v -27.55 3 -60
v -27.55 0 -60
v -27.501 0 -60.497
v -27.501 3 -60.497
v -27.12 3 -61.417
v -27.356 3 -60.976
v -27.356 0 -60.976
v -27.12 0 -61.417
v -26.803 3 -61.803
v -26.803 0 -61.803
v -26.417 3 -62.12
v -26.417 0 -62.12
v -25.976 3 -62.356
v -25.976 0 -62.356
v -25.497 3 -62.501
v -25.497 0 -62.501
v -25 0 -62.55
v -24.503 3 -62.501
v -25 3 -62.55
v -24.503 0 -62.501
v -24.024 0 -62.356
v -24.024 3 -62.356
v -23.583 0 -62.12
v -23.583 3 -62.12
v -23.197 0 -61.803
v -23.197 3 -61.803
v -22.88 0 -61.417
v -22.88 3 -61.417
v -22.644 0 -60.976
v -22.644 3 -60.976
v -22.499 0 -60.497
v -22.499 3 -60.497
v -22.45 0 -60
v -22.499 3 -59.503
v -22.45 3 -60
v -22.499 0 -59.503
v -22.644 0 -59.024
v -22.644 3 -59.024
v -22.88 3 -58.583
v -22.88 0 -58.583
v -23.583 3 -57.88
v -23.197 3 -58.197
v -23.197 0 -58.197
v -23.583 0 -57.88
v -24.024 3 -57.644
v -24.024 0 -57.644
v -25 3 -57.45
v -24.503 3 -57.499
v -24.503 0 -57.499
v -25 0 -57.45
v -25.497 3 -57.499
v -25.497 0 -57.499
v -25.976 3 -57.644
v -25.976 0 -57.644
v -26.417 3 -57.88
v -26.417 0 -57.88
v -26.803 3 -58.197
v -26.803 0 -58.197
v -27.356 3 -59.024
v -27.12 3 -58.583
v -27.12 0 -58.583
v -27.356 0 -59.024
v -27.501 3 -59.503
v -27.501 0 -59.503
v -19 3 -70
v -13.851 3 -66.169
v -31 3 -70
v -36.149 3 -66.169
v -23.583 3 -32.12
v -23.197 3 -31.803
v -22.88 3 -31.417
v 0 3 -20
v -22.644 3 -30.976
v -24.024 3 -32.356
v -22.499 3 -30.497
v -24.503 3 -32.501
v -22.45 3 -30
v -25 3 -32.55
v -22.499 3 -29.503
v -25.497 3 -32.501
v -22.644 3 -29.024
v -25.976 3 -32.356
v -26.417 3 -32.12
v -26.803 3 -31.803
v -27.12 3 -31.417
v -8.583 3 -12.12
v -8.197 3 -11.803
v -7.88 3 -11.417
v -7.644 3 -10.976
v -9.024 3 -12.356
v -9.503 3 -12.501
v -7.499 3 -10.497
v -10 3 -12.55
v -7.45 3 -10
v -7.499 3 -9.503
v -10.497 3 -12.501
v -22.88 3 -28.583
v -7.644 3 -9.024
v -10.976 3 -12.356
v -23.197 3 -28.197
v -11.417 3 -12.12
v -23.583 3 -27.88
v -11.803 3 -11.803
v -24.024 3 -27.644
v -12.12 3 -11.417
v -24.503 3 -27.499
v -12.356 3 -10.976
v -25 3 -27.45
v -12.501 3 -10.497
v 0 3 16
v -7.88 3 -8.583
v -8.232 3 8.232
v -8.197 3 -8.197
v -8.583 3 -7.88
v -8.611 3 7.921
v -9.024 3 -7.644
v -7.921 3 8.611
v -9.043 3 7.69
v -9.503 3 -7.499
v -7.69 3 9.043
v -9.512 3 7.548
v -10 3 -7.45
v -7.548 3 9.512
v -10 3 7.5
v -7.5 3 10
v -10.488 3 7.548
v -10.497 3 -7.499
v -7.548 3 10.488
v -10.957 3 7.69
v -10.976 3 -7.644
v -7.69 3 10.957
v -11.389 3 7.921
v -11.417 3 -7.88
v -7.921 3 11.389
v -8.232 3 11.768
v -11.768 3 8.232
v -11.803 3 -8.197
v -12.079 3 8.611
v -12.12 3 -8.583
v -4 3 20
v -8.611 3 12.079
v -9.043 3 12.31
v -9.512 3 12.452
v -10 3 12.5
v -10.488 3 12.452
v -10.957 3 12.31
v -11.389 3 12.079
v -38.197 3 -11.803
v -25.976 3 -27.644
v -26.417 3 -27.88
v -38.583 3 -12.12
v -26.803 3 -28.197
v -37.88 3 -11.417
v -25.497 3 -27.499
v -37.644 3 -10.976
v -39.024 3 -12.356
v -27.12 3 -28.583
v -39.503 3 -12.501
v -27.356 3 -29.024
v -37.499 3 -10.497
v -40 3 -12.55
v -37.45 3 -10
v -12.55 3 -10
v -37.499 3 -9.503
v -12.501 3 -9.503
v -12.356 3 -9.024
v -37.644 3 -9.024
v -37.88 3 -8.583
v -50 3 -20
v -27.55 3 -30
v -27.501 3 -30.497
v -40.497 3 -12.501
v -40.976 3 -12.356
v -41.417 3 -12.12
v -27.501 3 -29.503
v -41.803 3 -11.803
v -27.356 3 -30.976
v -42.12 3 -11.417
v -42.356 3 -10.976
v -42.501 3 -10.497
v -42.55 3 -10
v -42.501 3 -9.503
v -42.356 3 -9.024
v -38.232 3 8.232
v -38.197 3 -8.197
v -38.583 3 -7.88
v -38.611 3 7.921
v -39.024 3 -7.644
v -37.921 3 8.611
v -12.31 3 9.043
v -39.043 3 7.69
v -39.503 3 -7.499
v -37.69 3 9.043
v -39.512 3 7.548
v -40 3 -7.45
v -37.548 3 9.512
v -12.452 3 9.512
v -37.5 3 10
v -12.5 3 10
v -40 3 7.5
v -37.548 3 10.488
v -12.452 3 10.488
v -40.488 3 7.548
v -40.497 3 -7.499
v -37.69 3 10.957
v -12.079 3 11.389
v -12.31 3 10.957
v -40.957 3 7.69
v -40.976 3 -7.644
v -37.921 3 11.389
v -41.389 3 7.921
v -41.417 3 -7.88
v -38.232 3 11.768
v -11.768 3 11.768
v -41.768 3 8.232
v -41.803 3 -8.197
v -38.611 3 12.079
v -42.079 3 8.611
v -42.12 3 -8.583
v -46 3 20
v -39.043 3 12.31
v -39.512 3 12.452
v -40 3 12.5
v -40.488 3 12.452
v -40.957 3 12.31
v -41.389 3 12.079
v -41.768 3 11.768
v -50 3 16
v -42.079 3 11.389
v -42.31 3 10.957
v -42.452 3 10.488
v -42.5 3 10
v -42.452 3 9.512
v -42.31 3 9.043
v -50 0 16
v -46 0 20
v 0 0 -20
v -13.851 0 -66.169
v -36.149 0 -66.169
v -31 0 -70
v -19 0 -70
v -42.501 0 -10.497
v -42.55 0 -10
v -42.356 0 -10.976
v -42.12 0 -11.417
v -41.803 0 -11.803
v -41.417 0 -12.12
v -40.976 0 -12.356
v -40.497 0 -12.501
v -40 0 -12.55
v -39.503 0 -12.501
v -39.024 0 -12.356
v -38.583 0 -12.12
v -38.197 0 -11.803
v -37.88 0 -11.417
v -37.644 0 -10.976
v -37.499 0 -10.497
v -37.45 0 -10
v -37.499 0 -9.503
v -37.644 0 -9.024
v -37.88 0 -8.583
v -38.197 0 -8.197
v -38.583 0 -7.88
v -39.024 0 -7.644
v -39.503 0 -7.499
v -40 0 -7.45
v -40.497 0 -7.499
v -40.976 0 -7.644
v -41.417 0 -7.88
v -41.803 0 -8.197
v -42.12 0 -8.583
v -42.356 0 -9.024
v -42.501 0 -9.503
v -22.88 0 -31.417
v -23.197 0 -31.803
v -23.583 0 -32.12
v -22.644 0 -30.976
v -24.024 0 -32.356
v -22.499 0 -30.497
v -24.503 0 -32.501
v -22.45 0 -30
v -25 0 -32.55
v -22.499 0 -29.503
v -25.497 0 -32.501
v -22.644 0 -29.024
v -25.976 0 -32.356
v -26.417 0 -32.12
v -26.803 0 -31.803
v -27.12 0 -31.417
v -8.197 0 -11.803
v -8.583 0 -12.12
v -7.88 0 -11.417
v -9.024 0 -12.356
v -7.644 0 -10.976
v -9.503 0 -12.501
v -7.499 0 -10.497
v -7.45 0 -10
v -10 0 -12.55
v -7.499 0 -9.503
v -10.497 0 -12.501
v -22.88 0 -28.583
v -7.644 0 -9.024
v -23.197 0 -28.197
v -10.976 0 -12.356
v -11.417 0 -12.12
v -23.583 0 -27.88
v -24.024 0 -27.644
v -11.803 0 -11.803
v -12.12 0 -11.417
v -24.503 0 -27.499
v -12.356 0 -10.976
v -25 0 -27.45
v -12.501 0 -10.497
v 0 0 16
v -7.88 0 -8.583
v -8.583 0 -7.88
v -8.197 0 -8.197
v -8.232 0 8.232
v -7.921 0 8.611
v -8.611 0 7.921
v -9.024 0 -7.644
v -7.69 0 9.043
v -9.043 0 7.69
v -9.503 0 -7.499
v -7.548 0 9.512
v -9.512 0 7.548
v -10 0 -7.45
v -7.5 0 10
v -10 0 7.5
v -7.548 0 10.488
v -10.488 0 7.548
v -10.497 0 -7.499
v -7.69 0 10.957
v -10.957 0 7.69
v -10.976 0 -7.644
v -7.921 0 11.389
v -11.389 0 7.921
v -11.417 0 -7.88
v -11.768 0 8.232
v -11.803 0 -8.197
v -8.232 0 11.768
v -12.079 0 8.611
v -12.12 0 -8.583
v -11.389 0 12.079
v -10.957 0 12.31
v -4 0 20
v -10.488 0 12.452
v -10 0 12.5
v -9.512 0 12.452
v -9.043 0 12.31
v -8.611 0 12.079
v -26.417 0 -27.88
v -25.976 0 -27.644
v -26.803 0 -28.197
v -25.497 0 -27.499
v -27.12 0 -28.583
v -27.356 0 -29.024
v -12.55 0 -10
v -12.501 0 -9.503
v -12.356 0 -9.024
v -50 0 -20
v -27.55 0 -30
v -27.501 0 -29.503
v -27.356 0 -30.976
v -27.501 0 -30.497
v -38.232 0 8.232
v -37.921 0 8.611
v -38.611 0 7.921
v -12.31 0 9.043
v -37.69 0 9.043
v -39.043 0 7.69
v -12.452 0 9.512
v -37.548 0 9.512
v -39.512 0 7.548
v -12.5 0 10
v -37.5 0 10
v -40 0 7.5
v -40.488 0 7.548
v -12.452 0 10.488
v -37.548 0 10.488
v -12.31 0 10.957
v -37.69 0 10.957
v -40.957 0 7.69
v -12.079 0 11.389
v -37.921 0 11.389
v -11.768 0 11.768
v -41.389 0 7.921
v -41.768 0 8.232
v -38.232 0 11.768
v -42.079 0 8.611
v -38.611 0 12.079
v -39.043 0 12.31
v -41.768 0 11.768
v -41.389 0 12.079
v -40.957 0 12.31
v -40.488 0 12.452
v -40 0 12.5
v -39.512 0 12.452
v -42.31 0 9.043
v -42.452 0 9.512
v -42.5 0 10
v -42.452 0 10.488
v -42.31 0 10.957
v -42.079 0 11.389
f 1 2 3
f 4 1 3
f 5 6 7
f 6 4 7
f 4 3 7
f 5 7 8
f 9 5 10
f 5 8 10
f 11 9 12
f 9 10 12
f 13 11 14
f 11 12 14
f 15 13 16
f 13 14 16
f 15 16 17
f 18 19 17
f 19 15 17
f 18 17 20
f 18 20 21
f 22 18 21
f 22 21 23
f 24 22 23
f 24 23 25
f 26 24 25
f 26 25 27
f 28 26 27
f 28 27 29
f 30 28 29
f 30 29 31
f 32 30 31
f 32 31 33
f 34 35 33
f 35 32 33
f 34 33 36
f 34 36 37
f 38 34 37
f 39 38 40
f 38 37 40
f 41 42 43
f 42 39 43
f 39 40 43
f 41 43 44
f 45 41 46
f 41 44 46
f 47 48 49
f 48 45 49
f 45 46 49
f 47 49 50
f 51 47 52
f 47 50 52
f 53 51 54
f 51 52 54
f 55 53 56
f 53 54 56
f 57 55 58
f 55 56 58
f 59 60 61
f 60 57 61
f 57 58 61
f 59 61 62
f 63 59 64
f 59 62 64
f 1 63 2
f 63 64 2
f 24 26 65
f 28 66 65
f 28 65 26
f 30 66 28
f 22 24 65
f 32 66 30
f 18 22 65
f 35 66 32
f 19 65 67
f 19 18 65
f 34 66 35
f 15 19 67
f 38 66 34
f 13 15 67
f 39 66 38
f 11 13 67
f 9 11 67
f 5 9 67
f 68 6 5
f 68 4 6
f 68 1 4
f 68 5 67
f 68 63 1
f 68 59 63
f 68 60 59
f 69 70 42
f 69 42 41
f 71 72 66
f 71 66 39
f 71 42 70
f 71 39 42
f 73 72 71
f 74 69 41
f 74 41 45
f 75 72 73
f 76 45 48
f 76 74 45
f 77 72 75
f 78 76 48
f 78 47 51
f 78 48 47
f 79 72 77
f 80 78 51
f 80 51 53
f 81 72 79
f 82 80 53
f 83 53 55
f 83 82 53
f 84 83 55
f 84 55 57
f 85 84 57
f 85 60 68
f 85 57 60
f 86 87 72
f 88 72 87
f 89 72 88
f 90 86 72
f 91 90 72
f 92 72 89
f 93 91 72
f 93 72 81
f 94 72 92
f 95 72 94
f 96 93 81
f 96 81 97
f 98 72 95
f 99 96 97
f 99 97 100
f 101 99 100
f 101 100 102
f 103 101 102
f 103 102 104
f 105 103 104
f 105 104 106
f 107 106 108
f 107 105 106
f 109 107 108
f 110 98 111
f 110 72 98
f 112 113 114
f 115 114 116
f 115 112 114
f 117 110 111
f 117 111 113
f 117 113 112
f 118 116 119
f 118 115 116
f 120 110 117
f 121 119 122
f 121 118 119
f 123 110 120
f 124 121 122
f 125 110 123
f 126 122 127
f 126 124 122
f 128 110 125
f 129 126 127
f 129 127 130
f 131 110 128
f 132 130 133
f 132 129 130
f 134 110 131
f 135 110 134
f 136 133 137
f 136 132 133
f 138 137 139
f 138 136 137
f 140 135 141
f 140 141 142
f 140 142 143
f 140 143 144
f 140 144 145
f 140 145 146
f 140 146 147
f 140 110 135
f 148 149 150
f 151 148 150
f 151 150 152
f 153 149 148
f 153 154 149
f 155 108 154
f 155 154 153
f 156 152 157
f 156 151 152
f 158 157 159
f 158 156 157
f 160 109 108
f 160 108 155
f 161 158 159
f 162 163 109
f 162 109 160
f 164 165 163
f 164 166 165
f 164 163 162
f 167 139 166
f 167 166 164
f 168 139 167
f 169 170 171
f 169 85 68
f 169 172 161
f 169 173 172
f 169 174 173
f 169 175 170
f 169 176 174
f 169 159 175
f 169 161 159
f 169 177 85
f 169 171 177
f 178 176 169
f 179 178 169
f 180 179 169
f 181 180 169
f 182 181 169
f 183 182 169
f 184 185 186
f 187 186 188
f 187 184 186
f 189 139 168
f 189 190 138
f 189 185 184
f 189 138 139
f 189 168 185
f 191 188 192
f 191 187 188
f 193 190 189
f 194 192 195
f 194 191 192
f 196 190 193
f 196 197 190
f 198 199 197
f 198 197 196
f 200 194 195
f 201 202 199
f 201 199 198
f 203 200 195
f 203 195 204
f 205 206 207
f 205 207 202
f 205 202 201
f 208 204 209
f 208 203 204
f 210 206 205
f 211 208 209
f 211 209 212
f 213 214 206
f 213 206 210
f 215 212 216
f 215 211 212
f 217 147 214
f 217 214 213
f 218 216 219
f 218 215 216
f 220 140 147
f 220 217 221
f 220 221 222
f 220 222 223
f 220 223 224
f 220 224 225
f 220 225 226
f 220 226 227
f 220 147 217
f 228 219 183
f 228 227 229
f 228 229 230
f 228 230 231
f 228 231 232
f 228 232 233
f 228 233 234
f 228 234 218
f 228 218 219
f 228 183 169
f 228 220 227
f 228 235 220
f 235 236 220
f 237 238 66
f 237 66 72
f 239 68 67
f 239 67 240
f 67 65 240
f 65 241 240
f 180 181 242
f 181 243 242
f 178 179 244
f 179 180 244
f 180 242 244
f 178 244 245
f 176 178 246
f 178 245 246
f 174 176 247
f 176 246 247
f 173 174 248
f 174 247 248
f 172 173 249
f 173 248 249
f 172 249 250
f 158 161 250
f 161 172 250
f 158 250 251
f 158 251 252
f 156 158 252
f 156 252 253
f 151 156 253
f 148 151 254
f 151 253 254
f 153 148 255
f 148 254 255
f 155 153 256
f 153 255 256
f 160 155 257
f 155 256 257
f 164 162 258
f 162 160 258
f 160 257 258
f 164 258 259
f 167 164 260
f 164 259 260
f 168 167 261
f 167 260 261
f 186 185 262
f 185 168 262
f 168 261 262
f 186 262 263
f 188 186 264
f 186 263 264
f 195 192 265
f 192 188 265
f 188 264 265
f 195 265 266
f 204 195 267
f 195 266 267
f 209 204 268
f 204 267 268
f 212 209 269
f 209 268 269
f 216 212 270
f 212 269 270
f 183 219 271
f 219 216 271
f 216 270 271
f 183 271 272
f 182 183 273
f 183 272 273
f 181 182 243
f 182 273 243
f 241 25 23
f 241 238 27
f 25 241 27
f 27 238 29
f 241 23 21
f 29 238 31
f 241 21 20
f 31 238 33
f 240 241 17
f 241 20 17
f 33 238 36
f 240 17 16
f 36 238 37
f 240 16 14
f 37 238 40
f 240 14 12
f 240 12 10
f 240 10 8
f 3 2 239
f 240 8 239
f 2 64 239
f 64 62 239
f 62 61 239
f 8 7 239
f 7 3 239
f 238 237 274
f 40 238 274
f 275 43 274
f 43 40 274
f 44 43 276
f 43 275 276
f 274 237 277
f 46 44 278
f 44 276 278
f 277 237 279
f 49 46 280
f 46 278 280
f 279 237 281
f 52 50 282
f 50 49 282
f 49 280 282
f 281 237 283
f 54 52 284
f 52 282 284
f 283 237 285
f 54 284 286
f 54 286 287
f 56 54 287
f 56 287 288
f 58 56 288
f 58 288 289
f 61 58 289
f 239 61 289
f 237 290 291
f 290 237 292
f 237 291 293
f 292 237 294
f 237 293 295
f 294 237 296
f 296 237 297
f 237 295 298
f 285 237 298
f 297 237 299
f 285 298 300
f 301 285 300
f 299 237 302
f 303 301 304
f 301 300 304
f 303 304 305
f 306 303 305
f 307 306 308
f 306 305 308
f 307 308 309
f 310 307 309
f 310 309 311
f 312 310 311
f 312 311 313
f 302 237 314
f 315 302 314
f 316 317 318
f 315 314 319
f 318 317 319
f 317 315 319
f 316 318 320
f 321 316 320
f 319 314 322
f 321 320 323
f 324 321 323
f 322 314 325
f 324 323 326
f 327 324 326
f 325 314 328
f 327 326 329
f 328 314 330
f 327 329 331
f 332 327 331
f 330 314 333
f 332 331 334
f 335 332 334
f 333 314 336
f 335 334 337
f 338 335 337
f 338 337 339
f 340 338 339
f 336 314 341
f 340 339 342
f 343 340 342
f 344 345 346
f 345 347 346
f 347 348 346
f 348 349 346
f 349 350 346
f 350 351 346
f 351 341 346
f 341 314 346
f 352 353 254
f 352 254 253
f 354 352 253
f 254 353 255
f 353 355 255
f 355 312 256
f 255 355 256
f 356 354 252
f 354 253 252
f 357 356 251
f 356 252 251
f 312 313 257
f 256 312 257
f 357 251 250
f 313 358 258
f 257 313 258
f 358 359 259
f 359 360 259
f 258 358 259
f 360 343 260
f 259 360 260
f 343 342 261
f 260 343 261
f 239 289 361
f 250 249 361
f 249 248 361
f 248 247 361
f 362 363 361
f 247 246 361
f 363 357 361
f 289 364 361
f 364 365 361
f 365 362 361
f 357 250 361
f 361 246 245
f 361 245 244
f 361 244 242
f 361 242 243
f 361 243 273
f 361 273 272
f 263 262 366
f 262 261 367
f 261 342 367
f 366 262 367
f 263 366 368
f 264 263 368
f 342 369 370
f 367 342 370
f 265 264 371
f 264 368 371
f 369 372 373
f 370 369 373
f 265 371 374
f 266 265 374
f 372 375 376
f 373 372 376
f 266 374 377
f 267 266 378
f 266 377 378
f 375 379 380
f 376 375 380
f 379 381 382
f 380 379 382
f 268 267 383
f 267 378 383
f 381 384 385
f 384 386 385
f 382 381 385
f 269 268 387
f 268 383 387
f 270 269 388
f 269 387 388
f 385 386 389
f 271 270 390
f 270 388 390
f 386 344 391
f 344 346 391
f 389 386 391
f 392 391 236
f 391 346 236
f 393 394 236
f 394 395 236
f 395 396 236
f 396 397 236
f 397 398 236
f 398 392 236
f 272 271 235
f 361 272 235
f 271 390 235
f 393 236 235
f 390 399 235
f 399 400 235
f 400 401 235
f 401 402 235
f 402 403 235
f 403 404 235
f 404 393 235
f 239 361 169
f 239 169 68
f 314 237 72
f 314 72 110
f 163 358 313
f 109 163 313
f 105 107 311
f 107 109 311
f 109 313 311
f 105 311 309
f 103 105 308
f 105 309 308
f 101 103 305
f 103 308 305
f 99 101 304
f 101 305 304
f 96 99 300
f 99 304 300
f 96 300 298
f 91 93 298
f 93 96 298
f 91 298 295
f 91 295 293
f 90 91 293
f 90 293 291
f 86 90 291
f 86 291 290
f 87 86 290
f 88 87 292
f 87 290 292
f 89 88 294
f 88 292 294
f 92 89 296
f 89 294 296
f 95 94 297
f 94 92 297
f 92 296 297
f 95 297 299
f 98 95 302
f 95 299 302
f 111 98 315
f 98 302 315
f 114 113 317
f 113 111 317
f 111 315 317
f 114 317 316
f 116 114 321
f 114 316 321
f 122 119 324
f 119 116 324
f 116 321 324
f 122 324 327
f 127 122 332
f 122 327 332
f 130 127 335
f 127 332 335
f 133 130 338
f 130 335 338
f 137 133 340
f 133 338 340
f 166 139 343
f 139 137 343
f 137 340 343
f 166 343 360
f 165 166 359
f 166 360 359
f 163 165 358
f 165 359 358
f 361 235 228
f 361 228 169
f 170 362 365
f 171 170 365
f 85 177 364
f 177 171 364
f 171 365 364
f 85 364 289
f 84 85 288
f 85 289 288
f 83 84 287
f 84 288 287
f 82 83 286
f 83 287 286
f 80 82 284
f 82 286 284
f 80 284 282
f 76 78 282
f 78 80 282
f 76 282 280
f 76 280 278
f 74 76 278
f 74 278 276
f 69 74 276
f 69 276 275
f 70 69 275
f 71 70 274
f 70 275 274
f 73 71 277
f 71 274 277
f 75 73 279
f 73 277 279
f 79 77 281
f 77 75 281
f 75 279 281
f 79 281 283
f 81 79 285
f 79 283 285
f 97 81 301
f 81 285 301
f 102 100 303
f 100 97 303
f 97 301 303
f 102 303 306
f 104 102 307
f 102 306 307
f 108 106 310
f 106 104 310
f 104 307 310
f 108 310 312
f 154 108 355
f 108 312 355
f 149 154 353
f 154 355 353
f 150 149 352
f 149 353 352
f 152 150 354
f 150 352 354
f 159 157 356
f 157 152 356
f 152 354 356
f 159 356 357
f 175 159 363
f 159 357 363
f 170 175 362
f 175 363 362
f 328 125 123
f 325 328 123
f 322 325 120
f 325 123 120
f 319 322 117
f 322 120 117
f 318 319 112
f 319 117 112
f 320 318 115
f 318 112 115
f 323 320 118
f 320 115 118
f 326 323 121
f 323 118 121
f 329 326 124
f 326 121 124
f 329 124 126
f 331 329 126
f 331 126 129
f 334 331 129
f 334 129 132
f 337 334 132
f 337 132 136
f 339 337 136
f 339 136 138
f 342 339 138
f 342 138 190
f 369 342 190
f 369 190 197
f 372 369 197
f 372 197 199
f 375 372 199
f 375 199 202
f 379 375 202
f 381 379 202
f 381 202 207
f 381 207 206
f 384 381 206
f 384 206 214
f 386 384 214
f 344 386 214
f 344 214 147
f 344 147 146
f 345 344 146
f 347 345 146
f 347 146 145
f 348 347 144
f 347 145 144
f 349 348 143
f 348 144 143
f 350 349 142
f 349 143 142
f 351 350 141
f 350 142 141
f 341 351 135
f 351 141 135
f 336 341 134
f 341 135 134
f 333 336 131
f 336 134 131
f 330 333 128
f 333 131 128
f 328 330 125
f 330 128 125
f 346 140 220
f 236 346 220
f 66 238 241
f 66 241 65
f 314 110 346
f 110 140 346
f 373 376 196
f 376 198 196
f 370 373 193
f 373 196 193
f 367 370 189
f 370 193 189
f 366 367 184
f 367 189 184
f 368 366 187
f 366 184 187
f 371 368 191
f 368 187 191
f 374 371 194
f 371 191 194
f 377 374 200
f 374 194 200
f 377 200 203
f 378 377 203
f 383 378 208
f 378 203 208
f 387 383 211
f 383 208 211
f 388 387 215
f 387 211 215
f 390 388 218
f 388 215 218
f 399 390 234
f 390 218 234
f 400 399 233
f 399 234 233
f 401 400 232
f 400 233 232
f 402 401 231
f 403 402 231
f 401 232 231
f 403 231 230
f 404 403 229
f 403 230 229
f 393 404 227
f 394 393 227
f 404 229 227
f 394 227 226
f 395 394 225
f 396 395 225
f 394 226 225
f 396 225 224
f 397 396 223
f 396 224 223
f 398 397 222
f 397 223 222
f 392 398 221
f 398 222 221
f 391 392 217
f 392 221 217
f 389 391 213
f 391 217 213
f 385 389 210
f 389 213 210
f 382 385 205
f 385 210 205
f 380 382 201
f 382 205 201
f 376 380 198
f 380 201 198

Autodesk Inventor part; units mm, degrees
ref_plane "YZ Plane" through (0, 0, 0) normal (1, 0, 0) x (0, 1, 0)
ref_plane "XZ Plane" through (0, 0, 0) normal (0, 1, 0) x (-1, 0, 0)
ref_plane "XY Plane" through (0, 0, 0) normal (0, 0, 1) x (1, 0, 0)
sketch "草图1" plane through (0, 0, 0) normal (0, 1, 0) x (-1, 0, 0)
  line L0 (0, 0) -> (50, 0)
  line L1 (50, 0) -> (50, -20)
  line L2 (50, -20) -> (0, -20)
  line L3 (0, -20) -> (0, 0)
  line L4 (35, -20) -> (15, -20)
  line L5 (15, -20) -> (15, -70)
  line L6 (15, -70) -> (35, -70)
  line L7 (35, -70) -> (35, -20)
  line L8 (25, 0) -> (25, -7.1636)
  line L9 (50, -20) -> (35, -70)
  line L10 (15, -70) -> (0, -20)
  circle A0 centre (40, -10) radius 2.55
  circle A1 centre (10, -10) radius 2.55
  circle A2 centre (25, -30) radius 2.55
  circle A3 centre (25, -60) radius 2.55
  line L11 (50, -10) -> (45.4992, -10)
  dimension "d0" = 50
  dimension "d1" = 20
  dimension "d2" = 20
  dimension "d3" = 50
  dimension "d4" = 5.1
  dimension "d5" = 10
  dimension "d6" = 10
  dimension "d7" = 10
extrude "拉伸1" add sketch "草图1" along normal blind 3
chamfer "倒角1" distance 4 angle 45 2 edges at (0, 1.5, 0) (-50, 1.5, 0)
chamfer "倒角2" distance 4 angle 45 2 edges at (-15, 1.5, -70) (-35, 1.5, -70)
sketch "草图2" plane through (0, 3, 0) normal (0, 1, 0) x (1, 0, 0)
  line L0 (-50, 20) -> (-50, 4) projected
  line L1 (-50, 4) -> (0, 4)
  line L2 (0, 4) -> (0, -20)
  line L3 (0, -20) -> (-50, -20)
  line L4 (-50, -20) -> (-50, 4)
  line L5 (0, 4) -> (0, 20) projected
  line L6 (-46, 0) -> (-4, 0) projected
  circle A0 centre (-40, -10) radius 2.5
  circle A1 centre (-10, -10) radius 2.5
  circle A2 centre (-40, 10) radius 2.55 projected
  line L7 (-40, 10) -> (-10, 10)
  line L8 (-10, 10) -> (-10, -10)
  line L9 (-10, -10) -> (-40, -10)
  line L10 (-40, -10) -> (-40, 10)
  circle A3 centre (-10, 10) radius 2.55 projected
  point P0 (0, 0)
  point P1 (-40, 0)
  point P2 (-40, 4)
  point P3 (-10, 4)
  point P4 (-10, 0)
  dimension "d16" = 20
  dimension "d17" = 4
  dimension "d18" = 5
  dimension "d19" = 5
  dimension "d20" = 10
extrude "拉伸2" add sketch "草图2" against normal up to surface (3 mm away) contours L1 L10 A0 L9 A1 L8 L2 L3 L4 | L6 L8 A1 L9 A0 L10
chamfer "倒角3" distance 4 angle 45 2 edges at (-50, 1.5, 20) (0, 1.5, 20)
properties part number "body_fix2_camera"
